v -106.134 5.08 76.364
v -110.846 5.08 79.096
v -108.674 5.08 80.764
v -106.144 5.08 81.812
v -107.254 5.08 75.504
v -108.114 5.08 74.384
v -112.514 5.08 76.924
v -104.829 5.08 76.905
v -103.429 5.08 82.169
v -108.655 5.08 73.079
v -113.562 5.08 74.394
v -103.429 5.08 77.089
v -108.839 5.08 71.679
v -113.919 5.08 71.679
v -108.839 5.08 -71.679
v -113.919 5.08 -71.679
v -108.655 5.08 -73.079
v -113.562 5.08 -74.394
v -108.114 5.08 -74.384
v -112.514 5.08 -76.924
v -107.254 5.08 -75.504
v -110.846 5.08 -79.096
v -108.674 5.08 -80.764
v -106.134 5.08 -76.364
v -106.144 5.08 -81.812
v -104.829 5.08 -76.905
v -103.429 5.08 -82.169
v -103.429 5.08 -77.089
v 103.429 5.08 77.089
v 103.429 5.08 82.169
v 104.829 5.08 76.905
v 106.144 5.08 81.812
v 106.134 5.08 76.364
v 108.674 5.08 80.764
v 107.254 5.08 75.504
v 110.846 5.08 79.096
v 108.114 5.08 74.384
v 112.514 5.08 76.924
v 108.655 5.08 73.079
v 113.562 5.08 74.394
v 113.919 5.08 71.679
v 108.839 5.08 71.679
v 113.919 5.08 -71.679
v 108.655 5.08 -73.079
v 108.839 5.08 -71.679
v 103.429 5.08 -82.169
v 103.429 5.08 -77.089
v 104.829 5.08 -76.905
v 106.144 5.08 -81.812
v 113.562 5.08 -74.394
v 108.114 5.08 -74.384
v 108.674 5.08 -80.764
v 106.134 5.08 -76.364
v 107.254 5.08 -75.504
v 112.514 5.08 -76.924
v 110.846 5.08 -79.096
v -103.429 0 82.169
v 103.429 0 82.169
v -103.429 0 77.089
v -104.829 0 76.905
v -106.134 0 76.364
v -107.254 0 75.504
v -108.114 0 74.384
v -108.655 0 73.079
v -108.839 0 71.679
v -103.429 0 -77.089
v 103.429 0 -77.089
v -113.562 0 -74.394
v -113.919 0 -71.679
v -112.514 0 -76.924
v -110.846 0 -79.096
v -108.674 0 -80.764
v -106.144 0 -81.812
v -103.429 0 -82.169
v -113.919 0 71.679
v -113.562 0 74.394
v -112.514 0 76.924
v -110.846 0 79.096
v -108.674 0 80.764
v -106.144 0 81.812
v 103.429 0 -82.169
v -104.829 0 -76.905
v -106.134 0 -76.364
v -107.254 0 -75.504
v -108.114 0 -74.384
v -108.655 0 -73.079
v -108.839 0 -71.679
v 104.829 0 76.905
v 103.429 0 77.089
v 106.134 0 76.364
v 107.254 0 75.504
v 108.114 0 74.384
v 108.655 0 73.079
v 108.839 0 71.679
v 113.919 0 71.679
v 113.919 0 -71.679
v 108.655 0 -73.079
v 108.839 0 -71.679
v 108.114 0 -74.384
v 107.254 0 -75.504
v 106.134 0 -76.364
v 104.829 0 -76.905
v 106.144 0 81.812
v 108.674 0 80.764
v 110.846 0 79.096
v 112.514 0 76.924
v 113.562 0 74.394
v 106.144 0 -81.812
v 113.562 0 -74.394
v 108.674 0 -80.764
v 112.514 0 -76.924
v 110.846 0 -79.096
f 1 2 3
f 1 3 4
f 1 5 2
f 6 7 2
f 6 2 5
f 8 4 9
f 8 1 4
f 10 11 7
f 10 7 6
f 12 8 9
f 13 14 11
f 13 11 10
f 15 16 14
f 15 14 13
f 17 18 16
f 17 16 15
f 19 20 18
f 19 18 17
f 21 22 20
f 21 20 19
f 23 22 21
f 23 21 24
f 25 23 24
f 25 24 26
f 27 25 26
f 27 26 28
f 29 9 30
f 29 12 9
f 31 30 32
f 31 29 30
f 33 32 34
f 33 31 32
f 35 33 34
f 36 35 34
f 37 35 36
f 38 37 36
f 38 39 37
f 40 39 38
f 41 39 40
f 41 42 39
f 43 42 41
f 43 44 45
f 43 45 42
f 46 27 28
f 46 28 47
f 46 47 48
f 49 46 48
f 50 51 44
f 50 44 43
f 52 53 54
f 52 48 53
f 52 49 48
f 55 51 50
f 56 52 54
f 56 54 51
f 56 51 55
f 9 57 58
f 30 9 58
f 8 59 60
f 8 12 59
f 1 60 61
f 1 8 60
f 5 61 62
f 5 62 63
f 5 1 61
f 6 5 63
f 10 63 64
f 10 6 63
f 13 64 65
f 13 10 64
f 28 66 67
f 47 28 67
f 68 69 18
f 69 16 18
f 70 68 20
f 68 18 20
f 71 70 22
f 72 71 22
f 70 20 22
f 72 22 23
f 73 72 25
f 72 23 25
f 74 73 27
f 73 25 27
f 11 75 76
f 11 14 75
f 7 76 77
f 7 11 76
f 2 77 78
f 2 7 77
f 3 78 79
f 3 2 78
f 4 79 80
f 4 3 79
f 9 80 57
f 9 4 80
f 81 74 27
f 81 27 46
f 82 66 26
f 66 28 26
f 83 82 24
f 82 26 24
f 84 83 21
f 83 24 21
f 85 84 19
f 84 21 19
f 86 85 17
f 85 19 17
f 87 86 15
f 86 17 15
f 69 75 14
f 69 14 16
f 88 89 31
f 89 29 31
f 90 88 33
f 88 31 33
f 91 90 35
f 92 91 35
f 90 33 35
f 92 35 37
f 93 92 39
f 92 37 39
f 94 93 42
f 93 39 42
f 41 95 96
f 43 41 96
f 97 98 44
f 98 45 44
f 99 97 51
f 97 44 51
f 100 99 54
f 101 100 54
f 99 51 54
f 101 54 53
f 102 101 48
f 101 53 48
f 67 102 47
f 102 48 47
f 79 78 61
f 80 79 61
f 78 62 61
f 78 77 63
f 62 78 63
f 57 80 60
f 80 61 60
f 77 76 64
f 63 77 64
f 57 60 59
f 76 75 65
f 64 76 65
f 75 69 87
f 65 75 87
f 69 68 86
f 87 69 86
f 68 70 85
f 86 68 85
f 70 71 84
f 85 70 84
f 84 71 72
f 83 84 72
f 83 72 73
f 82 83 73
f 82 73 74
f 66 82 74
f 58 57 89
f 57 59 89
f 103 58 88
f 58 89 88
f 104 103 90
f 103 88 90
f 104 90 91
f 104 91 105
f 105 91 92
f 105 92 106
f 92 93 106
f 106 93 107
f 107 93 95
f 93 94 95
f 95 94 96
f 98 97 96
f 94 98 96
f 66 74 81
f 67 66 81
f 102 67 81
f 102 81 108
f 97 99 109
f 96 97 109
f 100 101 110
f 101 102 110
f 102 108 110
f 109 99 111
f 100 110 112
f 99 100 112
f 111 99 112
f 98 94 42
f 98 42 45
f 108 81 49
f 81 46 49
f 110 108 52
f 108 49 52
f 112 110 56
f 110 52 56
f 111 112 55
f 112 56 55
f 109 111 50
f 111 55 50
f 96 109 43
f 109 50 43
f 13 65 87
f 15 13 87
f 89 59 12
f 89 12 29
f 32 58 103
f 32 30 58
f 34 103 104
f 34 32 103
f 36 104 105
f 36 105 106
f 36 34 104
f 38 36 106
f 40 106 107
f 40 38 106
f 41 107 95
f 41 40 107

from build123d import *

# Parameters (mm, degrees)
SKETCH1_W      = 227.838
SKETCH1_H      = 164.338
SKETCH1_W_2    = 217.678
SKETCH1_H_2    = 154.178
EXTRUDE1_DEPTH = 5.08
FILLET1_R      = 5.4102
FILLET2_R      = 10.4902


with BuildPart() as part:
    # Sketch1 → Extrude1 (new body)
    with BuildSketch(Plane(origin=(0, 0, 0), x_dir=(1, 0, 0), z_dir=(0, 1, 0))):
        Rectangle(SKETCH1_W, SKETCH1_H)
        Rectangle(SKETCH1_W_2, SKETCH1_H_2, mode=Mode.SUBTRACT)
    extrude(amount=EXTRUDE1_DEPTH)

    # Fillet1
    fillet1_edges = [part.edges().sort_by_distance(p)[0] for p in [
        (-108.839, 2.54, -77.089),
        (-108.839, 2.54, 77.089),
        (108.839, 2.54, 77.089),
        (108.839, 2.54, -77.089),
    ]]
    fillet(fillet1_edges, radius=FILLET1_R)

    # Fillet2
    fillet2_edges = [part.edges().sort_by_distance(p)[0] for p in [
        (-113.919, 2.54, -82.169),
        (113.919, 2.54, -82.169),
        (113.919, 2.54, 82.169),
        (-113.919, 2.54, 82.169),
    ]]
    fillet(fillet2_edges, radius=FILLET2_R)


solid = part.part
